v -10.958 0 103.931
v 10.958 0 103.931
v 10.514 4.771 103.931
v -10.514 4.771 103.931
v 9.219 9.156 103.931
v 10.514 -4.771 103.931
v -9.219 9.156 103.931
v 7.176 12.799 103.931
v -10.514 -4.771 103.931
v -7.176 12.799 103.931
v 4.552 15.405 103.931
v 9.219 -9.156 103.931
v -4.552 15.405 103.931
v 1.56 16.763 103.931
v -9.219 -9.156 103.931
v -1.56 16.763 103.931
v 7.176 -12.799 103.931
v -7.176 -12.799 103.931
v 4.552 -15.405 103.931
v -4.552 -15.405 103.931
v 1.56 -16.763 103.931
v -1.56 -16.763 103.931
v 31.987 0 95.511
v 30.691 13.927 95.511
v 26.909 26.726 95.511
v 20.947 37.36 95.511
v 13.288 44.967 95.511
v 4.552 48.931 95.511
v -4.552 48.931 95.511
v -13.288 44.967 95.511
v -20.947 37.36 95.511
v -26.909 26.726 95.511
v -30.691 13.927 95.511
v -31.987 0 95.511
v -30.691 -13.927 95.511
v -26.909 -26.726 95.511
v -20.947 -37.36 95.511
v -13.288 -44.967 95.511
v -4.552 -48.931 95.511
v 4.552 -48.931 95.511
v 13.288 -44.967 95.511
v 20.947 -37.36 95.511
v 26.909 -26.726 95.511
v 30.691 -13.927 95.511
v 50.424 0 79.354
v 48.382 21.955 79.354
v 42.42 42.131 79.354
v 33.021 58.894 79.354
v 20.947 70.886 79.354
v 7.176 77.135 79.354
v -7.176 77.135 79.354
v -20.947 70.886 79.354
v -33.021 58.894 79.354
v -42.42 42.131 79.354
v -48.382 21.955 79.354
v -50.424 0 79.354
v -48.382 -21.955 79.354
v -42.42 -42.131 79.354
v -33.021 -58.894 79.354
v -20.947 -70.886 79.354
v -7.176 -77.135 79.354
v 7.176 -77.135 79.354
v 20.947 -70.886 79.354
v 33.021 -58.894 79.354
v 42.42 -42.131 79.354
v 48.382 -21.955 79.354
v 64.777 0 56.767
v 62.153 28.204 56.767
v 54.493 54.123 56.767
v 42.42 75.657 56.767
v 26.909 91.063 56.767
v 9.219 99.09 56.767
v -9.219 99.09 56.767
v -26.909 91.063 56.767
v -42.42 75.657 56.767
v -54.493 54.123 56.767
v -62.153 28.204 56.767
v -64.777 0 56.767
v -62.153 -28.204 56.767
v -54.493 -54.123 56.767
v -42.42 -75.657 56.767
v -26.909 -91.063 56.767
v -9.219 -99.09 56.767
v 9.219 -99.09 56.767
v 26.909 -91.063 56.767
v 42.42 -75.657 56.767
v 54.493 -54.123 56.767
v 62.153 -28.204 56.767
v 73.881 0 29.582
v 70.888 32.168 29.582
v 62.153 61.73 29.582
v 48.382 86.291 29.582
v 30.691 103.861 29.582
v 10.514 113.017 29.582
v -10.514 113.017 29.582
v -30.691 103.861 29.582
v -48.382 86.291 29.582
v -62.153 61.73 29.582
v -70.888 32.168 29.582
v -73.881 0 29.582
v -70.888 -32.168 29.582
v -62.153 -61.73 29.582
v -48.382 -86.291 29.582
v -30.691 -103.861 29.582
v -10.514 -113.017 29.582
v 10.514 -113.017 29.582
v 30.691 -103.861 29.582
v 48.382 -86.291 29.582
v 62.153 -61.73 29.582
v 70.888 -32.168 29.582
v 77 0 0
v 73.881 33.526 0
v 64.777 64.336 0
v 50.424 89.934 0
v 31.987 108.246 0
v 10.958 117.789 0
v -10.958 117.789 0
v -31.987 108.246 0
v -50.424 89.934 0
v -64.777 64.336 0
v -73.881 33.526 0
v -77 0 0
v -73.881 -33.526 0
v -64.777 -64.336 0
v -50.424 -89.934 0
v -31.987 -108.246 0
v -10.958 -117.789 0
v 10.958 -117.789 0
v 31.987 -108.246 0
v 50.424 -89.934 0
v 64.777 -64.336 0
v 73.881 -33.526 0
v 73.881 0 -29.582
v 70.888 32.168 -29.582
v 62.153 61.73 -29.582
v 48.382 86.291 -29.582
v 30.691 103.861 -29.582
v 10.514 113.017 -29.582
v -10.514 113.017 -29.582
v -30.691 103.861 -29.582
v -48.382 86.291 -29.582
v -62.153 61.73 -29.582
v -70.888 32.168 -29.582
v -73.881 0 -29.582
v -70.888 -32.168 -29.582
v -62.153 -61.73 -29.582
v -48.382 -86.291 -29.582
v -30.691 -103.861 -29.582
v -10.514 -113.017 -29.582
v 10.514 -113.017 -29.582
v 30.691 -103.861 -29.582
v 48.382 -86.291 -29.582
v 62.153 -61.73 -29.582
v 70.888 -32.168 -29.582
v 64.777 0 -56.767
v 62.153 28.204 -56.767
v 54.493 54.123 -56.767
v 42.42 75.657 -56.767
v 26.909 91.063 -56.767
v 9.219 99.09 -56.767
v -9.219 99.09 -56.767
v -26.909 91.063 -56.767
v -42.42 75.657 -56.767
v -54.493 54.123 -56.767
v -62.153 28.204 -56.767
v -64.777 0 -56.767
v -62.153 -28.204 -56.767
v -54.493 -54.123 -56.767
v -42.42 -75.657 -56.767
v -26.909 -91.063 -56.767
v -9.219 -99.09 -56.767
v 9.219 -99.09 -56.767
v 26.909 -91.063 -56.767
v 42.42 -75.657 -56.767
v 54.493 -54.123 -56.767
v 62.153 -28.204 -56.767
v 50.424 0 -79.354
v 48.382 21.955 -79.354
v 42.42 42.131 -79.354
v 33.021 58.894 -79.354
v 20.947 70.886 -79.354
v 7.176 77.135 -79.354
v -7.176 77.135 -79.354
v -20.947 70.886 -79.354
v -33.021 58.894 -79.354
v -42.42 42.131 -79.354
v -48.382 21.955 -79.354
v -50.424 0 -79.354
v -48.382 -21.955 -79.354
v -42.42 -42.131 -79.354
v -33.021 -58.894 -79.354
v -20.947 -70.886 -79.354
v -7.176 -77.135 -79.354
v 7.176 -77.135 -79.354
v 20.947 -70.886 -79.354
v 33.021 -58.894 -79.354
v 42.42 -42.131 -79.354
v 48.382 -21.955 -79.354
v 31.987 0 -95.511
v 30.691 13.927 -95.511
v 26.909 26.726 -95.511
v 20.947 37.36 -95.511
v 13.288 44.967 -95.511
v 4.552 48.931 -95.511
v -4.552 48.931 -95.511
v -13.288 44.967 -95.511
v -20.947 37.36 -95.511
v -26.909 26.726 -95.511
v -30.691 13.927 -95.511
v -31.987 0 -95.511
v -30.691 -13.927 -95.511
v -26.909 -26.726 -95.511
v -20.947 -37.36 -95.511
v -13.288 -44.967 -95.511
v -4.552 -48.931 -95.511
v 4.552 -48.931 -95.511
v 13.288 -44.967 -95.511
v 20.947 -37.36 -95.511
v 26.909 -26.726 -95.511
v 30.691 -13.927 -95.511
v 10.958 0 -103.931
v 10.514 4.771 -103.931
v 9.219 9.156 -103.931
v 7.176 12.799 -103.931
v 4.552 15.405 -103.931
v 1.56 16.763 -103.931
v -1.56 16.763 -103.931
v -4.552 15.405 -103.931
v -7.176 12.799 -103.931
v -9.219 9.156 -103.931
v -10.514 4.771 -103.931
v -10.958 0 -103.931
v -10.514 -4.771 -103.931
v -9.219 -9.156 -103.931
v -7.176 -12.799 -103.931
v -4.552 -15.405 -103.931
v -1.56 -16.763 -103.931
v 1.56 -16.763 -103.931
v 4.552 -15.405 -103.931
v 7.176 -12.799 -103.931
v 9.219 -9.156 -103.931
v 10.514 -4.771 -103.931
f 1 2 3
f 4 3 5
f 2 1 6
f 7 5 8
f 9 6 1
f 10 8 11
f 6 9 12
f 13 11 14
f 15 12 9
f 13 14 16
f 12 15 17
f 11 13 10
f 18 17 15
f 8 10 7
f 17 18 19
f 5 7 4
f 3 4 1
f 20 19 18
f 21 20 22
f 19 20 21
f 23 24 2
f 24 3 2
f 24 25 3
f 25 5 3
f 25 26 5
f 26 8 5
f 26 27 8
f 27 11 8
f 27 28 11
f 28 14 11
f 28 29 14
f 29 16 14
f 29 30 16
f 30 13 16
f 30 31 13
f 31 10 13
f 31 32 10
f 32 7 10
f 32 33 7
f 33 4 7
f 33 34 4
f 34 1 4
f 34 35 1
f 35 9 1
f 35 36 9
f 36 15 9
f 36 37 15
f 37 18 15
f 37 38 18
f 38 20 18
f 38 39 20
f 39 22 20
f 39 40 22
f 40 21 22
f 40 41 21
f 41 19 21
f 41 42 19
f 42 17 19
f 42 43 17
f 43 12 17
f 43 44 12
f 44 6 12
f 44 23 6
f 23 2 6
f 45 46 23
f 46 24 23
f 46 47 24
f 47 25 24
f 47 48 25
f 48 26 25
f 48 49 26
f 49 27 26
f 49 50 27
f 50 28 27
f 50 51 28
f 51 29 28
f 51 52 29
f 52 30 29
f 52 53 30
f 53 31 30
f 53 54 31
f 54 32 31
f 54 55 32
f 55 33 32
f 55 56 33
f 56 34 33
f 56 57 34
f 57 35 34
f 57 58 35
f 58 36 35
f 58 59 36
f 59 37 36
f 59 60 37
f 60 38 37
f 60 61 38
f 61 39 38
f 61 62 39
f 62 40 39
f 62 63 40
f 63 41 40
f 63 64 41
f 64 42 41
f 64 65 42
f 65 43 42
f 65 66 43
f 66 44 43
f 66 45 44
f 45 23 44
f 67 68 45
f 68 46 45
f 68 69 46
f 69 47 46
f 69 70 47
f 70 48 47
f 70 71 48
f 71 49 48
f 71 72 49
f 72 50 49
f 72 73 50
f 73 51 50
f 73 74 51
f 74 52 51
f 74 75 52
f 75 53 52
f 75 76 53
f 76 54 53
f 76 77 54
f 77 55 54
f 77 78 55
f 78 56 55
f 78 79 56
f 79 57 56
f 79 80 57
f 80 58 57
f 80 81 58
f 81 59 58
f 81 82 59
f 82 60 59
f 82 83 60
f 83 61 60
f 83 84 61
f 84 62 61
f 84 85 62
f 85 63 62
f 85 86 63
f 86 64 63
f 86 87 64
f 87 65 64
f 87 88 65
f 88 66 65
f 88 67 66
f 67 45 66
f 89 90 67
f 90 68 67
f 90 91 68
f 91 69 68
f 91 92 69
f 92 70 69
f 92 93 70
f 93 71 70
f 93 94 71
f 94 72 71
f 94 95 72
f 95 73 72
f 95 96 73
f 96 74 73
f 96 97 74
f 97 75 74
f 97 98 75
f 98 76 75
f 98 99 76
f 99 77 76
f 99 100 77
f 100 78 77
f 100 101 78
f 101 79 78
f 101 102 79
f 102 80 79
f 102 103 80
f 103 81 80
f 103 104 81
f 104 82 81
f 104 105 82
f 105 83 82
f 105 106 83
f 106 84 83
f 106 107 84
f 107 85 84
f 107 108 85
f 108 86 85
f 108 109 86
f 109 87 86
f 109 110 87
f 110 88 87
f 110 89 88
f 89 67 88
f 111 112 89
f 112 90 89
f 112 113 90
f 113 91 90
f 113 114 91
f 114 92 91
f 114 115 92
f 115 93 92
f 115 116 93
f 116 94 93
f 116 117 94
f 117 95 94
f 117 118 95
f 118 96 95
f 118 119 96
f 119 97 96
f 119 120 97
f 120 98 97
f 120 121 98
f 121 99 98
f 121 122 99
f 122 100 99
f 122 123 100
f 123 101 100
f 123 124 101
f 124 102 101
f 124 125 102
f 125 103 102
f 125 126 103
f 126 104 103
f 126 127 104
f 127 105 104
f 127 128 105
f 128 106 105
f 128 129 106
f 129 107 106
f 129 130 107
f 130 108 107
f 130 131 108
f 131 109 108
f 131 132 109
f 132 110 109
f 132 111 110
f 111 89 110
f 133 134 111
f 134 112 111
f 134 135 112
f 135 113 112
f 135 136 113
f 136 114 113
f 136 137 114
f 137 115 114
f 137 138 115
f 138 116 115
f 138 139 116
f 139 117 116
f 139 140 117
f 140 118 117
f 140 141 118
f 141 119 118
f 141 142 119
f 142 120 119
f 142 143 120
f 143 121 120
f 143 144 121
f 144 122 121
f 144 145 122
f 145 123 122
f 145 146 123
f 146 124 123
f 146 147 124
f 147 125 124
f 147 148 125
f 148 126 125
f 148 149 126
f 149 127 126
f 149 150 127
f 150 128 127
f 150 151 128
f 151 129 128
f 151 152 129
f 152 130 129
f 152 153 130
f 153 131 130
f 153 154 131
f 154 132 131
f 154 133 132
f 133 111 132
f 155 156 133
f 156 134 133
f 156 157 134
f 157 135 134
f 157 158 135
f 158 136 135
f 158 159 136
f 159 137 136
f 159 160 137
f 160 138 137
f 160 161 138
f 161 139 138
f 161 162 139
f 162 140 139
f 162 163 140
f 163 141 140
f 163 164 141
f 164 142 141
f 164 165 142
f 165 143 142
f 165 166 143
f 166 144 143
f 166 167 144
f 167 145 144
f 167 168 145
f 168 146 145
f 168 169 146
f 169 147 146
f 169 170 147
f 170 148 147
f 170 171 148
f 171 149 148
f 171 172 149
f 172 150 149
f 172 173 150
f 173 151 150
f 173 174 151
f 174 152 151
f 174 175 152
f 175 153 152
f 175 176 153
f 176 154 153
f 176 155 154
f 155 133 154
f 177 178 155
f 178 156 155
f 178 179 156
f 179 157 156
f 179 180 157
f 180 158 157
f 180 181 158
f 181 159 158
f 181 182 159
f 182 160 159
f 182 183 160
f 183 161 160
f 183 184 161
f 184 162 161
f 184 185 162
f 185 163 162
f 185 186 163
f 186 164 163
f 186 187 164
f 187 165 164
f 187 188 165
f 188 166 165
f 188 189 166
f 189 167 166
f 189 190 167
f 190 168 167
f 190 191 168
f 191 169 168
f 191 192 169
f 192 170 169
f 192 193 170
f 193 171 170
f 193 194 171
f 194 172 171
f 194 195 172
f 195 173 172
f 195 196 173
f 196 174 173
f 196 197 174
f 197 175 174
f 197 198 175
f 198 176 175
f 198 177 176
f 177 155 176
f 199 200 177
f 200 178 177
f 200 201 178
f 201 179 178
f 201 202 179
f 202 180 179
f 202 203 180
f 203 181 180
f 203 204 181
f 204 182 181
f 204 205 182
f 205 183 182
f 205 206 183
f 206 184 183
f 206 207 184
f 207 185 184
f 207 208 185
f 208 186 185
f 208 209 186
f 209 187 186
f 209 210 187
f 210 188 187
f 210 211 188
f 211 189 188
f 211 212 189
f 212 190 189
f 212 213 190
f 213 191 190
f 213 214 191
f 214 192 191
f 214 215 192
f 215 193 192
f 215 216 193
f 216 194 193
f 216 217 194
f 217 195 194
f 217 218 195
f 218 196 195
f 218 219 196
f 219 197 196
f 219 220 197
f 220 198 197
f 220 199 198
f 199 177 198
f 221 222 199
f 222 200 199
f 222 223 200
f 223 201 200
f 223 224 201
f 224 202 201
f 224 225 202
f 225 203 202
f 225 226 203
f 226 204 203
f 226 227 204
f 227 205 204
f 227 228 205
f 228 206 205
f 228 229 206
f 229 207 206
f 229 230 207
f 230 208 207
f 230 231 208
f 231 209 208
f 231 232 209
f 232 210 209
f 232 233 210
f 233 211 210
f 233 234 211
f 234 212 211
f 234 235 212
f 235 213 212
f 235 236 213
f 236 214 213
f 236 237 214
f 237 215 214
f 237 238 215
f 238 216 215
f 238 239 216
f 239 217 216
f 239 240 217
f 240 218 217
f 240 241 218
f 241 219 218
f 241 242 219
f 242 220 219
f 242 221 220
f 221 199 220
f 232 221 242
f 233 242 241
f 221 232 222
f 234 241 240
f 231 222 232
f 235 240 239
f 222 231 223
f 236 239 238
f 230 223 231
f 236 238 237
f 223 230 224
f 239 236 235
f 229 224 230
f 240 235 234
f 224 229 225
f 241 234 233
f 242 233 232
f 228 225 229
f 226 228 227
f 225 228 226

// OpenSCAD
// Generated by SolidPython 1.0.1 on 2020-07-29 00:46:50


scale(v = [11, 17, 15]) {
	sphere(r = 7);
}
/***********************************************
*********      SolidPython code:      **********
************************************************
 
# import packages: SolidPython
from solid import *
from solid.utils import *
from itertools import chain, combinations, permutations


class Resize:

    def __init__(self, scad_file):
        self.scad_file = scad_file
        #self.scad_file = import_scad(scad_file)
        # cone/cylinder param:
        self.r1 = 0
        self.r2 = 0
        self.h = 0
        # rectangular prism param:
        self.w = 0
        self.l = 0
        # ellipse param:
        self.r = 0

    # import OpenScad code (file name corresponds to shape)


    # classify shape + parameters
    def assign(self, param1, param2, param3):
        if self.scad_file == 'cone.scad':
            self.r1 = param1
            self.r2 = param2
            self.h = param3
        elif self.scad_file == 'cylinder.scad':
            self.r1 = param1
            self.r2 = param2
            self.h = param3
        elif self.scad_file == 'rectangularPrism.scad':
            self.h = param1
            self.l = param2
            self.w = param3
        else:
            self.r = param1
            self.h = param2

    # resize parameters
    def iterate(self):
        x = range(3, 20, 2)
        i = 1
        if self.scad_file == 'cone.scad':
            tempList = list(permutations(x, 2))
            for temp in tempList:
                param1 = temp[0]
                param2 = temp[1]
                filepath = 'produced_scad_files/' + 'cone' + str(param1) + '_' + str(param2) + '_' + '.scad'
                scad_render_to_file(cylinder(h=param1, r1=param2, r2=0), filepath)

        elif self.scad_file == 'cylinder.scad':
            tempList = list(permutations(x, 3))
            for temp in tempList:
                param1 = temp[0]
                param2 = temp[1]
                filepath = 'produced_scad_files/' + 'cylinder' + str(param1) + '_' + str(param2) + '_' + '.scad'
                scad_render_to_file(cylinder(h=param1, r1=param2, r2=param2), filepath)

        elif self.scad_file == 'rectangularPrism.scad':
            tempList = list(permutations(x, 3))
            for temp in tempList:
                param1 = temp[0]
                param2 = temp[1]
                param3 = temp[2]
                filepath = 'produced_scad_files/' + 'rectangularPrism' + str(param1) + '_' + str(param2) + '_' + str(
                    param3) + '.scad'
                scad_render_to_file(cube(size=(param1, param2, param3)), filepath)

        elif self.scad_file == 'ellipse.scad':
            tempList = list(permutations(x, 4))
            for temp in tempList:
                param1 = temp[0]
                param2 = temp[1]
                param3 = temp[2]
                param4 = temp[3]
                filepath = 'produced_scad_files/' + 'ellipse' + str(param1) + '_' + str(param2) + '_' + str(param3) + '_' + str(param4) + '.scad'
                scad_render_to_file(scale([param1, param2, param3])(sphere(r=param4)), filepath)

    def render_to_scadfile(self):
        scad_render_to_file(scad, 'example.scad') 
 
************************************************/
